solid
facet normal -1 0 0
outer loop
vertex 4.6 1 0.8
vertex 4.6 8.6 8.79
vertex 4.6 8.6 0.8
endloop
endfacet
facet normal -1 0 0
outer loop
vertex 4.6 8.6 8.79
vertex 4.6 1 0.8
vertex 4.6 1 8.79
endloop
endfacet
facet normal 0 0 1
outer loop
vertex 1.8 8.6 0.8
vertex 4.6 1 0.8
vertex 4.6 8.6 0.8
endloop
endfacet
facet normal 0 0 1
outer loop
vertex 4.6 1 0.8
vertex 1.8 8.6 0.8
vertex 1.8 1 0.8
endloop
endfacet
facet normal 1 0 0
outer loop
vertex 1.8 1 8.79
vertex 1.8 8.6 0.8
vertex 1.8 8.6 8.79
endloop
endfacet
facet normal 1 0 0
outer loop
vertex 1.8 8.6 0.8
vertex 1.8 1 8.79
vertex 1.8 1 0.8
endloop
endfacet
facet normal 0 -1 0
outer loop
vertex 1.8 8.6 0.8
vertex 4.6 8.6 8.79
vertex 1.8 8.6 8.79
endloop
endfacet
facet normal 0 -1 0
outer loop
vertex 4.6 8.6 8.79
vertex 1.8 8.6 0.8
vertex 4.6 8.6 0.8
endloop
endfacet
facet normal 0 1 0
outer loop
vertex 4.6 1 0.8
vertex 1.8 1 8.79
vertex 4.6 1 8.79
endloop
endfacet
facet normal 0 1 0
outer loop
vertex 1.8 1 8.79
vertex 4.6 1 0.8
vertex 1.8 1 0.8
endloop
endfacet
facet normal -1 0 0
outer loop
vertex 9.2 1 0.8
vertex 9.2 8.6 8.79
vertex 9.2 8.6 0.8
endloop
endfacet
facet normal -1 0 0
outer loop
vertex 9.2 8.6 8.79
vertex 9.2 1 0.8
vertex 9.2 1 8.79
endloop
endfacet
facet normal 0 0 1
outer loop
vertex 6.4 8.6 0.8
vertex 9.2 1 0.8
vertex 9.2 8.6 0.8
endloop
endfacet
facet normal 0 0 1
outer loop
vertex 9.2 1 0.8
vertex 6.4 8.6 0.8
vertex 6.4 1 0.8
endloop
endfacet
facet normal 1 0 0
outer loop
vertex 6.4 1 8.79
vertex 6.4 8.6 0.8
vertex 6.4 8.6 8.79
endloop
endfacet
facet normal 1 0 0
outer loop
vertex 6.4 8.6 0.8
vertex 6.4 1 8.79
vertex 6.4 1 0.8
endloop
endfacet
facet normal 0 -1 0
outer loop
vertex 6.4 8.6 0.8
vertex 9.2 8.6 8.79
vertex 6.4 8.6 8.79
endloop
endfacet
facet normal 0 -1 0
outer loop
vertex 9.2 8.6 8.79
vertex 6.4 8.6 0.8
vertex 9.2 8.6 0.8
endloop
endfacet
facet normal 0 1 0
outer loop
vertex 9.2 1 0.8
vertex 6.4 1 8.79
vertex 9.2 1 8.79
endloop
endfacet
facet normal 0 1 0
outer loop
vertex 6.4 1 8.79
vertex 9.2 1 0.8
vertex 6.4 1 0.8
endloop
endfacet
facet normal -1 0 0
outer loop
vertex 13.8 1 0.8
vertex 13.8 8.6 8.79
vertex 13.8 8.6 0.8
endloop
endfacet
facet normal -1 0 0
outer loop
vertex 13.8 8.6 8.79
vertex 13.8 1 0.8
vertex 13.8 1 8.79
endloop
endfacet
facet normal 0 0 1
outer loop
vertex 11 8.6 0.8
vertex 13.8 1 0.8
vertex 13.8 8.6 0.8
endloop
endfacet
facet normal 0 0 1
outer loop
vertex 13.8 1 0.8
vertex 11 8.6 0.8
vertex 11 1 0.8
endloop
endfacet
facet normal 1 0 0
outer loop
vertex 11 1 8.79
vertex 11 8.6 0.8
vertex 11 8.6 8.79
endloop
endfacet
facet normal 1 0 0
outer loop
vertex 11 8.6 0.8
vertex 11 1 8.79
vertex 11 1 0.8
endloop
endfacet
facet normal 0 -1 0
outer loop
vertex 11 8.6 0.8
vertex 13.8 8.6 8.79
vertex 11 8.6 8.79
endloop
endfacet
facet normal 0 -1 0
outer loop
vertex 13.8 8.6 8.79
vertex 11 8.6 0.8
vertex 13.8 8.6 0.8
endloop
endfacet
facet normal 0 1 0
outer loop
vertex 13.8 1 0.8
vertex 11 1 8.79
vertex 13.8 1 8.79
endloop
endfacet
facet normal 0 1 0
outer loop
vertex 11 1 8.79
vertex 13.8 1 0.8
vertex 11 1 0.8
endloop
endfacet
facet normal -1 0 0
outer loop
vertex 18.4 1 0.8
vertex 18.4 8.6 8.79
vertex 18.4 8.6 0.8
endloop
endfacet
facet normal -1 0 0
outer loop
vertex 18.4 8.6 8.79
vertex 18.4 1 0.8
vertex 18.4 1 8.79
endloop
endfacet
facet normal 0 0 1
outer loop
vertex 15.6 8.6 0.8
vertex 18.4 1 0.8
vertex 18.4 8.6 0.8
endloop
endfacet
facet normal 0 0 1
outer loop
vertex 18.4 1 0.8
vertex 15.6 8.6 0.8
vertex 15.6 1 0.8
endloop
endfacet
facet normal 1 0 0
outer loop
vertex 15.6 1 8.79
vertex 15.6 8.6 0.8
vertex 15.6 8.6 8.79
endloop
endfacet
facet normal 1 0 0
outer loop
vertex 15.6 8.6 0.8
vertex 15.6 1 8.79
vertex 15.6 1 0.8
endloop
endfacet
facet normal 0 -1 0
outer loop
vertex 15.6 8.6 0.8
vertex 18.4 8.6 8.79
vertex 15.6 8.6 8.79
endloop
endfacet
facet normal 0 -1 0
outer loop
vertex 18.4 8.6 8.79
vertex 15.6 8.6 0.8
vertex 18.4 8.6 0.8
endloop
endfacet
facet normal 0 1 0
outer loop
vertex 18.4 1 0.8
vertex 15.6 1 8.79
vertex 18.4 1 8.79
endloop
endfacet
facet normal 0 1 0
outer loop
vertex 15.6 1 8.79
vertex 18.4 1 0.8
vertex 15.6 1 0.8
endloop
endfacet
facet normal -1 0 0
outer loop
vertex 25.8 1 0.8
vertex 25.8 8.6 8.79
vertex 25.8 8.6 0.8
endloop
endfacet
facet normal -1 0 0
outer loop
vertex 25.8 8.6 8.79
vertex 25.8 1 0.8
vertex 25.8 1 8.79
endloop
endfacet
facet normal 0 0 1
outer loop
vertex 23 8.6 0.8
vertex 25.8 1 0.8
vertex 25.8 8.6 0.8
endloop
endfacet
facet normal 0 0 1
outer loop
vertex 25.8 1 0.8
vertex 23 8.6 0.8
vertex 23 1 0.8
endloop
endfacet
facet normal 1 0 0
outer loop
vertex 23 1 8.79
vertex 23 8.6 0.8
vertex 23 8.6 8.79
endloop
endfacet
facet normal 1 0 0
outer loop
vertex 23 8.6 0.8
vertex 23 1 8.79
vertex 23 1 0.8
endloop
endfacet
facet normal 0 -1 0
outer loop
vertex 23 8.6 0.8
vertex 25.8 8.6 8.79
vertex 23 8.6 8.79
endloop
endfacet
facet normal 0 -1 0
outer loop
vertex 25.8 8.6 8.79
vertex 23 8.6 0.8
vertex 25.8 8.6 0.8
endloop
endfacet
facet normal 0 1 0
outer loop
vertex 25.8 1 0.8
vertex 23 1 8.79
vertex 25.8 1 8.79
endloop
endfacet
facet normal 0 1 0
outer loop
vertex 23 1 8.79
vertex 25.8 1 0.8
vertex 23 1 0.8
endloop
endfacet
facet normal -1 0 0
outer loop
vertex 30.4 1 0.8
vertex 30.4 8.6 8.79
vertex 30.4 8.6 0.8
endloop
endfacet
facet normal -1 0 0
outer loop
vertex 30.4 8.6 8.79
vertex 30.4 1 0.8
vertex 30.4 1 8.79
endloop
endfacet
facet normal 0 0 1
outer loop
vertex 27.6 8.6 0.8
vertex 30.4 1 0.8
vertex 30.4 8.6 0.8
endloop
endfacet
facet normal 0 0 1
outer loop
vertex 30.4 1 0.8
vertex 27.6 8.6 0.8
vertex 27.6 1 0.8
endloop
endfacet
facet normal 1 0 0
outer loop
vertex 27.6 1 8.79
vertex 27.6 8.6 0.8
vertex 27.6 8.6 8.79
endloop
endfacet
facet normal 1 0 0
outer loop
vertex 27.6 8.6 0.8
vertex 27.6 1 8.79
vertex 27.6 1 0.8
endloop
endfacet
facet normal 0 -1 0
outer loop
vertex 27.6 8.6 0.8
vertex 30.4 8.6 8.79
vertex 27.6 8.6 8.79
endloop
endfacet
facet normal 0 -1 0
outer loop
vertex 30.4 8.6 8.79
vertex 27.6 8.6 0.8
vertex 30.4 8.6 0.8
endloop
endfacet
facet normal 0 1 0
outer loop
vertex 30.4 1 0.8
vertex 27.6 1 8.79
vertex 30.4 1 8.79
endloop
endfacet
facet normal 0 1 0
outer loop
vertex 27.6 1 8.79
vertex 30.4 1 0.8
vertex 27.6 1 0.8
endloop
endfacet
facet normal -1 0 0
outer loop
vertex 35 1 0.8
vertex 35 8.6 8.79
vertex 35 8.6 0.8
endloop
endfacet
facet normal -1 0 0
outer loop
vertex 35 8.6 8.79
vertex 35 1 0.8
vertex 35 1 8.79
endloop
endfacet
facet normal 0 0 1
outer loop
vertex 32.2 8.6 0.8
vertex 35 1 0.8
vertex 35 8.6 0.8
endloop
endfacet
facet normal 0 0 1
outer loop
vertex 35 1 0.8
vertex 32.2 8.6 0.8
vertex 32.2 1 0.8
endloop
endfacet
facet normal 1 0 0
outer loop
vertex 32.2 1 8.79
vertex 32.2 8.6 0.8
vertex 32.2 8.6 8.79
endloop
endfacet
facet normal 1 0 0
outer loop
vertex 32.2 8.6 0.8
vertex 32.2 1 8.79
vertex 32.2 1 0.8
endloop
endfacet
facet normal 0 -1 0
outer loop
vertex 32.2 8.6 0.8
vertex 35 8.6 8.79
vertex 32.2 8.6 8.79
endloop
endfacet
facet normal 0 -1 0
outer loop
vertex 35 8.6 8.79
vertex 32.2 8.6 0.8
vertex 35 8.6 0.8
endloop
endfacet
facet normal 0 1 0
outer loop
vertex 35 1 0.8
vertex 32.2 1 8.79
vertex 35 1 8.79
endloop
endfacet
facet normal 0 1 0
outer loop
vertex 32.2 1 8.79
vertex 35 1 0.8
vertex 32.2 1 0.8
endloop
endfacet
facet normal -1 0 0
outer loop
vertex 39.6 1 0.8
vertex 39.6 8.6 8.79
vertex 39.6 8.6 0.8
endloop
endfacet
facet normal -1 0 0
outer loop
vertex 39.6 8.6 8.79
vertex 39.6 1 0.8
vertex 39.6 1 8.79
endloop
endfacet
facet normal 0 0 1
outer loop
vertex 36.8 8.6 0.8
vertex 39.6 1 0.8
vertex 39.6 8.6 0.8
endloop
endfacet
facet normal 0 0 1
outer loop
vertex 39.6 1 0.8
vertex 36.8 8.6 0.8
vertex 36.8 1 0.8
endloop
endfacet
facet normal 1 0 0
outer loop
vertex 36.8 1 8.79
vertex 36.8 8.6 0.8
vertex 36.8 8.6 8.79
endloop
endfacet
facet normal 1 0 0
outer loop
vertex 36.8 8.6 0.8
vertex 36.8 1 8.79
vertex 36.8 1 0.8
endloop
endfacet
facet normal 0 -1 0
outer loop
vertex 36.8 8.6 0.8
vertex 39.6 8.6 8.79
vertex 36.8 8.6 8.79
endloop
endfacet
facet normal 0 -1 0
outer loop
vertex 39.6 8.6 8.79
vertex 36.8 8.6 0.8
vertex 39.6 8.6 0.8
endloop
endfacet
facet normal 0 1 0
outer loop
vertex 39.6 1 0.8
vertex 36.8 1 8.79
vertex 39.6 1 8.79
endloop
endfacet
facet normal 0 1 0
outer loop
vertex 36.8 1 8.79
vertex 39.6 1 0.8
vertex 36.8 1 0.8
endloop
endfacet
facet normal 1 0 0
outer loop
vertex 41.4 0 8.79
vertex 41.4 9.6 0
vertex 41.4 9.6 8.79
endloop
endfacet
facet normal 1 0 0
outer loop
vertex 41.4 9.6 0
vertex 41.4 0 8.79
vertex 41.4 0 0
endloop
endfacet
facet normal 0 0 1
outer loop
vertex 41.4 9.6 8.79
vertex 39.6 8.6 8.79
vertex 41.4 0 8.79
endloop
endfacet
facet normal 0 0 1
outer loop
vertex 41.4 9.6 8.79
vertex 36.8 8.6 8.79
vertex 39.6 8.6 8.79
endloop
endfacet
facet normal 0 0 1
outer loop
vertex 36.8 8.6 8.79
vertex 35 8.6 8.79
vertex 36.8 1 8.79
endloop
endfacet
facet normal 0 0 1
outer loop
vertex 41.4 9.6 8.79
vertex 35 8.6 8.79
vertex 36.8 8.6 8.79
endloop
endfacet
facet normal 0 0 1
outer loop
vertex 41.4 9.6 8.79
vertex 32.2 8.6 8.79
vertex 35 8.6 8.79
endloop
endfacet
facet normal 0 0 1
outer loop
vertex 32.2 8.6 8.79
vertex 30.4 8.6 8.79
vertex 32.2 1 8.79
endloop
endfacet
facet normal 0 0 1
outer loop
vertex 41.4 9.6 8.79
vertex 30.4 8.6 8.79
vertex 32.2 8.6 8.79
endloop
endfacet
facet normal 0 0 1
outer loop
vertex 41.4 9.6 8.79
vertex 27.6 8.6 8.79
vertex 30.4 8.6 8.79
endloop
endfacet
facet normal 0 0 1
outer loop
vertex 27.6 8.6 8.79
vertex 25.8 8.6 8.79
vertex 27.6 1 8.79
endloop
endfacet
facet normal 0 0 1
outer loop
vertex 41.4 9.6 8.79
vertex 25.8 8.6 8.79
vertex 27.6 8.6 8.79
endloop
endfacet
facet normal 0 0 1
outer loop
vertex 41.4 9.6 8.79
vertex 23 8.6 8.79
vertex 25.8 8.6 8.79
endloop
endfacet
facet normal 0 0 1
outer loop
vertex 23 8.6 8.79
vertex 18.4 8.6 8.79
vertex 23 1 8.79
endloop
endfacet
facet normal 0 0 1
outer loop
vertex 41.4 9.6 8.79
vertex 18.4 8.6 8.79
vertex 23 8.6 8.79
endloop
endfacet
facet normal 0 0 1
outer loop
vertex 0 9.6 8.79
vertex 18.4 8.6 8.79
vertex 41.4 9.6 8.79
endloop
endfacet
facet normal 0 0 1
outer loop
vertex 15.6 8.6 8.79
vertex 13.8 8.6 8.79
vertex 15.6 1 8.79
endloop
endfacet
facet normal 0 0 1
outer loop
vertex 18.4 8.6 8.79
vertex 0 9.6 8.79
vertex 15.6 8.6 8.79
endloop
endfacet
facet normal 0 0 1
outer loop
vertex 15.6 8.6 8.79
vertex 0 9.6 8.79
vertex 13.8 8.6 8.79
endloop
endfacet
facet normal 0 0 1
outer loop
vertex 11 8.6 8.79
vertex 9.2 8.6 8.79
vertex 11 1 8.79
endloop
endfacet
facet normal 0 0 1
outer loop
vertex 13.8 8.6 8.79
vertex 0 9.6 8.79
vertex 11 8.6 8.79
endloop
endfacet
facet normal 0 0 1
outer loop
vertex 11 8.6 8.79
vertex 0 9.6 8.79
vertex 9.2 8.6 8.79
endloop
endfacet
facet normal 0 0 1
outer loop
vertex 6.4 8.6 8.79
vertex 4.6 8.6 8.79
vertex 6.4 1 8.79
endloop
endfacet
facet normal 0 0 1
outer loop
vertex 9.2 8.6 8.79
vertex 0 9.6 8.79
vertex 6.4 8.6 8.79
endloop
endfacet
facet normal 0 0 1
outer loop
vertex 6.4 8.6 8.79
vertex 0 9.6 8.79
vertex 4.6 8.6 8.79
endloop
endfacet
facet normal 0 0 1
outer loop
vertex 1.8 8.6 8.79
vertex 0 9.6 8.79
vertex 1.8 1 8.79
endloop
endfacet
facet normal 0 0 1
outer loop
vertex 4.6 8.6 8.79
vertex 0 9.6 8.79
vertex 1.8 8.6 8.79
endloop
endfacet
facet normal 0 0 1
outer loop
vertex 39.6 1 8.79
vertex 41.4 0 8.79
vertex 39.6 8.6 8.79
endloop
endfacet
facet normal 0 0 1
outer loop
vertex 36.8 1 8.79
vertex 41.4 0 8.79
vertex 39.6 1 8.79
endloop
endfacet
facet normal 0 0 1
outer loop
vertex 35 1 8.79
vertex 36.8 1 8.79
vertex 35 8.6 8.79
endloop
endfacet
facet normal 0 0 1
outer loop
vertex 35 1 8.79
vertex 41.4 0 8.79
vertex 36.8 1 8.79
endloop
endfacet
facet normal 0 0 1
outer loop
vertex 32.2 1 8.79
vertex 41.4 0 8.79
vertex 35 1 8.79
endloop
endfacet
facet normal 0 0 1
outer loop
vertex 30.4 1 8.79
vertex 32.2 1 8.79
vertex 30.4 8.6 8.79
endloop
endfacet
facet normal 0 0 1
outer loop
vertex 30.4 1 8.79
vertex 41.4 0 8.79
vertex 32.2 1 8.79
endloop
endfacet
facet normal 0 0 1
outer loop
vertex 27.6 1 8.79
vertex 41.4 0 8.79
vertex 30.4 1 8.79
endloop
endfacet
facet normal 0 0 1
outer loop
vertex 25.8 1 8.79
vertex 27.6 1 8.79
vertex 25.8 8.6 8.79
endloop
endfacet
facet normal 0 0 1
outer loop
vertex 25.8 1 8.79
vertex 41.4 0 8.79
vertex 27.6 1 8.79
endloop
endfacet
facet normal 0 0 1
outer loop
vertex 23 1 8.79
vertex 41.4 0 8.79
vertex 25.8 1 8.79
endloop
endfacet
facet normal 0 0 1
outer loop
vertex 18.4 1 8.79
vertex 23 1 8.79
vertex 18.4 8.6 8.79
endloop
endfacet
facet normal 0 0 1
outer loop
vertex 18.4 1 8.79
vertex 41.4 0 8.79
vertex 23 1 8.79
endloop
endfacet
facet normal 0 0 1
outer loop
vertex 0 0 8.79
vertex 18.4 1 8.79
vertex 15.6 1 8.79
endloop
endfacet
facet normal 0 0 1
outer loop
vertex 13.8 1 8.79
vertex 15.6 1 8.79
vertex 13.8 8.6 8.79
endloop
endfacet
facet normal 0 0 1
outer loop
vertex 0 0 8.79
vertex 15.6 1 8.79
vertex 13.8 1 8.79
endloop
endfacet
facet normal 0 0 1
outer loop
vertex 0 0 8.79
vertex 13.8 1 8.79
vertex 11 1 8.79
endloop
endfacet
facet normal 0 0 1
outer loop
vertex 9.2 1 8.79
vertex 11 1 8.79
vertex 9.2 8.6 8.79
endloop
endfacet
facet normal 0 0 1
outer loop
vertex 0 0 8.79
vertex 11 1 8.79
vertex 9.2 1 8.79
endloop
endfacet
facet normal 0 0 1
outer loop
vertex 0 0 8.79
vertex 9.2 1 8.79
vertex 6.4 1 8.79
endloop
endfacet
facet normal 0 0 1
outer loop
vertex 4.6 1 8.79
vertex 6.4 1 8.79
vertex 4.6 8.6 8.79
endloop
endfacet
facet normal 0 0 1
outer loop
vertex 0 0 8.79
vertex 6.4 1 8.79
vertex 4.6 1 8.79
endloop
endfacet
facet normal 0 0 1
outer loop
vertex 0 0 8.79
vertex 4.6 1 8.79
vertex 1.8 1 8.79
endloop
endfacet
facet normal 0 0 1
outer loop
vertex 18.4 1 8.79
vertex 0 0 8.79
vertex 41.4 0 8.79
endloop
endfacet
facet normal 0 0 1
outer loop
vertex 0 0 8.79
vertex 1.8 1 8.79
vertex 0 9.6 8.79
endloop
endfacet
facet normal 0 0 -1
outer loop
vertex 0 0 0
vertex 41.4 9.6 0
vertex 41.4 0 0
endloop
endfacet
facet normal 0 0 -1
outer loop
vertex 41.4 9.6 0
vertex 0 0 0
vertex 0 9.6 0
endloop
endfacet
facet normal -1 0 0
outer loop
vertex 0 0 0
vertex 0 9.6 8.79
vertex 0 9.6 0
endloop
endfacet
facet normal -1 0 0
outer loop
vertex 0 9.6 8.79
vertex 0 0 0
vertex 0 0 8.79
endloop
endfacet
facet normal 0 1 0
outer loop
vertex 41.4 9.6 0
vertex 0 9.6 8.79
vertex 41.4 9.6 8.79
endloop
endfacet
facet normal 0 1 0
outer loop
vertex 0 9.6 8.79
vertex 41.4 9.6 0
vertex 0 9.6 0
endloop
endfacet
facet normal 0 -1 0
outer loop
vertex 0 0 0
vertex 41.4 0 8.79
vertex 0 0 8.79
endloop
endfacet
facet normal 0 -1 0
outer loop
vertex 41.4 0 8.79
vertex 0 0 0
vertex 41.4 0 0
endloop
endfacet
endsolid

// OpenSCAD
DELTA=0.01;

BLUE=[0.3, 0.3, 1];
WHITE=[1, 1, 1];

DIMW=84.2-1.2;
DIMH=55.2-0.4;
DIMZ=6.8;
THICK=1.4;
MAGIC1 = 3.7;

SWH=10;
SWW=22;
SWZ=5;

SWPOSLEFT=2.6;
SWOUT=0.2;

PINW=1;
PINH=1.4;
PINZ=1.2;
PINNUM=10;

module switches()
{
    module _pin()
    {
        color(WHITE) cube([PINW, PINH, PINZ]);
    }

    color(BLUE) cube([SWW, SWH, SWZ]);
    pad = SWW / (PINNUM + 1);
    for(i=[0:1:(PINNUM-1)])
    {
        translate([PINW + i * pad, (SWH - PINH)/2 - PINH * (i%2), SWZ - PINZ / 2]) _pin();
    }
}

WIREW = 4;
WIREH = 4;
WIREPADW = 3 + THICK;
WIREPADH = 3 + THICK;
WIREZ = DIMZ + THICK + DELTA * 2;

SHORTER = 14;
BIGHOLEW = 47 - SHORTER;

module case()
{
    difference()
    {
        cube([DIMW + THICK * 2, DIMH + THICK * 2, DIMZ + THICK]);
        translate([THICK, THICK, -DELTA]) cube([DIMW, DIMH, DIMZ - MAGIC1 + DELTA * 2]);
        translate([THICK + 1, THICK + 1, -DELTA]) cube([DIMW - 2, DIMH - 2, DIMZ + DELTA * 2]);
        HOLEW = SWW + SWOUT * 2;
        HOLEH = SWH + SWOUT * 2;
        translate([SWPOSLEFT - SWOUT + THICK, (DIMH + THICK * 2 - HOLEH)/2]) cube([HOLEW, HOLEH, DIMZ + THICK + DELTA * 2]);

        translate([DIMW - WIREPADW - THICK - 1, DIMH - WIREPADH - THICK - 1, -DELTA]) cube([WIREW,WIREH,WIREZ]);
        translate([DIMW - WIREPADW - THICK - 1, 3+THICK, -DELTA]) cube([WIREW,WIREH,WIREZ]);
        translate([DIMW - BIGHOLEW - THICK - 1 - SHORTER, WIREPADH, -DELTA]) cube([BIGHOLEW, 12, DIMZ + THICK + DELTA * 2]);
    }
}

//color(WHITE) case();
//translate([SWPOSLEFT + THICK, ( DIMH - SWH + THICK*2 ) / 2, 0]) switches();

module cap()
{
    difference()
    {
        cube([BIGHOLEW-0.6, 12-0.6, 12]);
        translate([0.7, 0.7, -DELTA]) cube([BIGHOLEW-2, 12-2, 12 - 3.4 + DELTA * 2]);
        for(i=[0:1:7])
        {
            translate([3 + i*3.8,(12-0.6)/2,0]) cylinder(h=12-0.4, r=3.5/2,$fn=50);
        }
    }
}

//translate([DIMW - BIGHOLEW - THICK - 1 - SHORTER, WIREPADH, DIMZ + THICK -DELTA]) cap();

L=2.8;
W=7.6;
H=8;
D=1.8;
P=2.8;
BT=0.8;

difference()
{
    cube([P + (L+D)*8+D, W+2, H+BT-DELTA]);
    for(i=[0:1:7])
    {
        translate([P*(i>3?1:0) + D + (L+D)*i, 1, BT]) cube([L, W, H]);
    }
}
